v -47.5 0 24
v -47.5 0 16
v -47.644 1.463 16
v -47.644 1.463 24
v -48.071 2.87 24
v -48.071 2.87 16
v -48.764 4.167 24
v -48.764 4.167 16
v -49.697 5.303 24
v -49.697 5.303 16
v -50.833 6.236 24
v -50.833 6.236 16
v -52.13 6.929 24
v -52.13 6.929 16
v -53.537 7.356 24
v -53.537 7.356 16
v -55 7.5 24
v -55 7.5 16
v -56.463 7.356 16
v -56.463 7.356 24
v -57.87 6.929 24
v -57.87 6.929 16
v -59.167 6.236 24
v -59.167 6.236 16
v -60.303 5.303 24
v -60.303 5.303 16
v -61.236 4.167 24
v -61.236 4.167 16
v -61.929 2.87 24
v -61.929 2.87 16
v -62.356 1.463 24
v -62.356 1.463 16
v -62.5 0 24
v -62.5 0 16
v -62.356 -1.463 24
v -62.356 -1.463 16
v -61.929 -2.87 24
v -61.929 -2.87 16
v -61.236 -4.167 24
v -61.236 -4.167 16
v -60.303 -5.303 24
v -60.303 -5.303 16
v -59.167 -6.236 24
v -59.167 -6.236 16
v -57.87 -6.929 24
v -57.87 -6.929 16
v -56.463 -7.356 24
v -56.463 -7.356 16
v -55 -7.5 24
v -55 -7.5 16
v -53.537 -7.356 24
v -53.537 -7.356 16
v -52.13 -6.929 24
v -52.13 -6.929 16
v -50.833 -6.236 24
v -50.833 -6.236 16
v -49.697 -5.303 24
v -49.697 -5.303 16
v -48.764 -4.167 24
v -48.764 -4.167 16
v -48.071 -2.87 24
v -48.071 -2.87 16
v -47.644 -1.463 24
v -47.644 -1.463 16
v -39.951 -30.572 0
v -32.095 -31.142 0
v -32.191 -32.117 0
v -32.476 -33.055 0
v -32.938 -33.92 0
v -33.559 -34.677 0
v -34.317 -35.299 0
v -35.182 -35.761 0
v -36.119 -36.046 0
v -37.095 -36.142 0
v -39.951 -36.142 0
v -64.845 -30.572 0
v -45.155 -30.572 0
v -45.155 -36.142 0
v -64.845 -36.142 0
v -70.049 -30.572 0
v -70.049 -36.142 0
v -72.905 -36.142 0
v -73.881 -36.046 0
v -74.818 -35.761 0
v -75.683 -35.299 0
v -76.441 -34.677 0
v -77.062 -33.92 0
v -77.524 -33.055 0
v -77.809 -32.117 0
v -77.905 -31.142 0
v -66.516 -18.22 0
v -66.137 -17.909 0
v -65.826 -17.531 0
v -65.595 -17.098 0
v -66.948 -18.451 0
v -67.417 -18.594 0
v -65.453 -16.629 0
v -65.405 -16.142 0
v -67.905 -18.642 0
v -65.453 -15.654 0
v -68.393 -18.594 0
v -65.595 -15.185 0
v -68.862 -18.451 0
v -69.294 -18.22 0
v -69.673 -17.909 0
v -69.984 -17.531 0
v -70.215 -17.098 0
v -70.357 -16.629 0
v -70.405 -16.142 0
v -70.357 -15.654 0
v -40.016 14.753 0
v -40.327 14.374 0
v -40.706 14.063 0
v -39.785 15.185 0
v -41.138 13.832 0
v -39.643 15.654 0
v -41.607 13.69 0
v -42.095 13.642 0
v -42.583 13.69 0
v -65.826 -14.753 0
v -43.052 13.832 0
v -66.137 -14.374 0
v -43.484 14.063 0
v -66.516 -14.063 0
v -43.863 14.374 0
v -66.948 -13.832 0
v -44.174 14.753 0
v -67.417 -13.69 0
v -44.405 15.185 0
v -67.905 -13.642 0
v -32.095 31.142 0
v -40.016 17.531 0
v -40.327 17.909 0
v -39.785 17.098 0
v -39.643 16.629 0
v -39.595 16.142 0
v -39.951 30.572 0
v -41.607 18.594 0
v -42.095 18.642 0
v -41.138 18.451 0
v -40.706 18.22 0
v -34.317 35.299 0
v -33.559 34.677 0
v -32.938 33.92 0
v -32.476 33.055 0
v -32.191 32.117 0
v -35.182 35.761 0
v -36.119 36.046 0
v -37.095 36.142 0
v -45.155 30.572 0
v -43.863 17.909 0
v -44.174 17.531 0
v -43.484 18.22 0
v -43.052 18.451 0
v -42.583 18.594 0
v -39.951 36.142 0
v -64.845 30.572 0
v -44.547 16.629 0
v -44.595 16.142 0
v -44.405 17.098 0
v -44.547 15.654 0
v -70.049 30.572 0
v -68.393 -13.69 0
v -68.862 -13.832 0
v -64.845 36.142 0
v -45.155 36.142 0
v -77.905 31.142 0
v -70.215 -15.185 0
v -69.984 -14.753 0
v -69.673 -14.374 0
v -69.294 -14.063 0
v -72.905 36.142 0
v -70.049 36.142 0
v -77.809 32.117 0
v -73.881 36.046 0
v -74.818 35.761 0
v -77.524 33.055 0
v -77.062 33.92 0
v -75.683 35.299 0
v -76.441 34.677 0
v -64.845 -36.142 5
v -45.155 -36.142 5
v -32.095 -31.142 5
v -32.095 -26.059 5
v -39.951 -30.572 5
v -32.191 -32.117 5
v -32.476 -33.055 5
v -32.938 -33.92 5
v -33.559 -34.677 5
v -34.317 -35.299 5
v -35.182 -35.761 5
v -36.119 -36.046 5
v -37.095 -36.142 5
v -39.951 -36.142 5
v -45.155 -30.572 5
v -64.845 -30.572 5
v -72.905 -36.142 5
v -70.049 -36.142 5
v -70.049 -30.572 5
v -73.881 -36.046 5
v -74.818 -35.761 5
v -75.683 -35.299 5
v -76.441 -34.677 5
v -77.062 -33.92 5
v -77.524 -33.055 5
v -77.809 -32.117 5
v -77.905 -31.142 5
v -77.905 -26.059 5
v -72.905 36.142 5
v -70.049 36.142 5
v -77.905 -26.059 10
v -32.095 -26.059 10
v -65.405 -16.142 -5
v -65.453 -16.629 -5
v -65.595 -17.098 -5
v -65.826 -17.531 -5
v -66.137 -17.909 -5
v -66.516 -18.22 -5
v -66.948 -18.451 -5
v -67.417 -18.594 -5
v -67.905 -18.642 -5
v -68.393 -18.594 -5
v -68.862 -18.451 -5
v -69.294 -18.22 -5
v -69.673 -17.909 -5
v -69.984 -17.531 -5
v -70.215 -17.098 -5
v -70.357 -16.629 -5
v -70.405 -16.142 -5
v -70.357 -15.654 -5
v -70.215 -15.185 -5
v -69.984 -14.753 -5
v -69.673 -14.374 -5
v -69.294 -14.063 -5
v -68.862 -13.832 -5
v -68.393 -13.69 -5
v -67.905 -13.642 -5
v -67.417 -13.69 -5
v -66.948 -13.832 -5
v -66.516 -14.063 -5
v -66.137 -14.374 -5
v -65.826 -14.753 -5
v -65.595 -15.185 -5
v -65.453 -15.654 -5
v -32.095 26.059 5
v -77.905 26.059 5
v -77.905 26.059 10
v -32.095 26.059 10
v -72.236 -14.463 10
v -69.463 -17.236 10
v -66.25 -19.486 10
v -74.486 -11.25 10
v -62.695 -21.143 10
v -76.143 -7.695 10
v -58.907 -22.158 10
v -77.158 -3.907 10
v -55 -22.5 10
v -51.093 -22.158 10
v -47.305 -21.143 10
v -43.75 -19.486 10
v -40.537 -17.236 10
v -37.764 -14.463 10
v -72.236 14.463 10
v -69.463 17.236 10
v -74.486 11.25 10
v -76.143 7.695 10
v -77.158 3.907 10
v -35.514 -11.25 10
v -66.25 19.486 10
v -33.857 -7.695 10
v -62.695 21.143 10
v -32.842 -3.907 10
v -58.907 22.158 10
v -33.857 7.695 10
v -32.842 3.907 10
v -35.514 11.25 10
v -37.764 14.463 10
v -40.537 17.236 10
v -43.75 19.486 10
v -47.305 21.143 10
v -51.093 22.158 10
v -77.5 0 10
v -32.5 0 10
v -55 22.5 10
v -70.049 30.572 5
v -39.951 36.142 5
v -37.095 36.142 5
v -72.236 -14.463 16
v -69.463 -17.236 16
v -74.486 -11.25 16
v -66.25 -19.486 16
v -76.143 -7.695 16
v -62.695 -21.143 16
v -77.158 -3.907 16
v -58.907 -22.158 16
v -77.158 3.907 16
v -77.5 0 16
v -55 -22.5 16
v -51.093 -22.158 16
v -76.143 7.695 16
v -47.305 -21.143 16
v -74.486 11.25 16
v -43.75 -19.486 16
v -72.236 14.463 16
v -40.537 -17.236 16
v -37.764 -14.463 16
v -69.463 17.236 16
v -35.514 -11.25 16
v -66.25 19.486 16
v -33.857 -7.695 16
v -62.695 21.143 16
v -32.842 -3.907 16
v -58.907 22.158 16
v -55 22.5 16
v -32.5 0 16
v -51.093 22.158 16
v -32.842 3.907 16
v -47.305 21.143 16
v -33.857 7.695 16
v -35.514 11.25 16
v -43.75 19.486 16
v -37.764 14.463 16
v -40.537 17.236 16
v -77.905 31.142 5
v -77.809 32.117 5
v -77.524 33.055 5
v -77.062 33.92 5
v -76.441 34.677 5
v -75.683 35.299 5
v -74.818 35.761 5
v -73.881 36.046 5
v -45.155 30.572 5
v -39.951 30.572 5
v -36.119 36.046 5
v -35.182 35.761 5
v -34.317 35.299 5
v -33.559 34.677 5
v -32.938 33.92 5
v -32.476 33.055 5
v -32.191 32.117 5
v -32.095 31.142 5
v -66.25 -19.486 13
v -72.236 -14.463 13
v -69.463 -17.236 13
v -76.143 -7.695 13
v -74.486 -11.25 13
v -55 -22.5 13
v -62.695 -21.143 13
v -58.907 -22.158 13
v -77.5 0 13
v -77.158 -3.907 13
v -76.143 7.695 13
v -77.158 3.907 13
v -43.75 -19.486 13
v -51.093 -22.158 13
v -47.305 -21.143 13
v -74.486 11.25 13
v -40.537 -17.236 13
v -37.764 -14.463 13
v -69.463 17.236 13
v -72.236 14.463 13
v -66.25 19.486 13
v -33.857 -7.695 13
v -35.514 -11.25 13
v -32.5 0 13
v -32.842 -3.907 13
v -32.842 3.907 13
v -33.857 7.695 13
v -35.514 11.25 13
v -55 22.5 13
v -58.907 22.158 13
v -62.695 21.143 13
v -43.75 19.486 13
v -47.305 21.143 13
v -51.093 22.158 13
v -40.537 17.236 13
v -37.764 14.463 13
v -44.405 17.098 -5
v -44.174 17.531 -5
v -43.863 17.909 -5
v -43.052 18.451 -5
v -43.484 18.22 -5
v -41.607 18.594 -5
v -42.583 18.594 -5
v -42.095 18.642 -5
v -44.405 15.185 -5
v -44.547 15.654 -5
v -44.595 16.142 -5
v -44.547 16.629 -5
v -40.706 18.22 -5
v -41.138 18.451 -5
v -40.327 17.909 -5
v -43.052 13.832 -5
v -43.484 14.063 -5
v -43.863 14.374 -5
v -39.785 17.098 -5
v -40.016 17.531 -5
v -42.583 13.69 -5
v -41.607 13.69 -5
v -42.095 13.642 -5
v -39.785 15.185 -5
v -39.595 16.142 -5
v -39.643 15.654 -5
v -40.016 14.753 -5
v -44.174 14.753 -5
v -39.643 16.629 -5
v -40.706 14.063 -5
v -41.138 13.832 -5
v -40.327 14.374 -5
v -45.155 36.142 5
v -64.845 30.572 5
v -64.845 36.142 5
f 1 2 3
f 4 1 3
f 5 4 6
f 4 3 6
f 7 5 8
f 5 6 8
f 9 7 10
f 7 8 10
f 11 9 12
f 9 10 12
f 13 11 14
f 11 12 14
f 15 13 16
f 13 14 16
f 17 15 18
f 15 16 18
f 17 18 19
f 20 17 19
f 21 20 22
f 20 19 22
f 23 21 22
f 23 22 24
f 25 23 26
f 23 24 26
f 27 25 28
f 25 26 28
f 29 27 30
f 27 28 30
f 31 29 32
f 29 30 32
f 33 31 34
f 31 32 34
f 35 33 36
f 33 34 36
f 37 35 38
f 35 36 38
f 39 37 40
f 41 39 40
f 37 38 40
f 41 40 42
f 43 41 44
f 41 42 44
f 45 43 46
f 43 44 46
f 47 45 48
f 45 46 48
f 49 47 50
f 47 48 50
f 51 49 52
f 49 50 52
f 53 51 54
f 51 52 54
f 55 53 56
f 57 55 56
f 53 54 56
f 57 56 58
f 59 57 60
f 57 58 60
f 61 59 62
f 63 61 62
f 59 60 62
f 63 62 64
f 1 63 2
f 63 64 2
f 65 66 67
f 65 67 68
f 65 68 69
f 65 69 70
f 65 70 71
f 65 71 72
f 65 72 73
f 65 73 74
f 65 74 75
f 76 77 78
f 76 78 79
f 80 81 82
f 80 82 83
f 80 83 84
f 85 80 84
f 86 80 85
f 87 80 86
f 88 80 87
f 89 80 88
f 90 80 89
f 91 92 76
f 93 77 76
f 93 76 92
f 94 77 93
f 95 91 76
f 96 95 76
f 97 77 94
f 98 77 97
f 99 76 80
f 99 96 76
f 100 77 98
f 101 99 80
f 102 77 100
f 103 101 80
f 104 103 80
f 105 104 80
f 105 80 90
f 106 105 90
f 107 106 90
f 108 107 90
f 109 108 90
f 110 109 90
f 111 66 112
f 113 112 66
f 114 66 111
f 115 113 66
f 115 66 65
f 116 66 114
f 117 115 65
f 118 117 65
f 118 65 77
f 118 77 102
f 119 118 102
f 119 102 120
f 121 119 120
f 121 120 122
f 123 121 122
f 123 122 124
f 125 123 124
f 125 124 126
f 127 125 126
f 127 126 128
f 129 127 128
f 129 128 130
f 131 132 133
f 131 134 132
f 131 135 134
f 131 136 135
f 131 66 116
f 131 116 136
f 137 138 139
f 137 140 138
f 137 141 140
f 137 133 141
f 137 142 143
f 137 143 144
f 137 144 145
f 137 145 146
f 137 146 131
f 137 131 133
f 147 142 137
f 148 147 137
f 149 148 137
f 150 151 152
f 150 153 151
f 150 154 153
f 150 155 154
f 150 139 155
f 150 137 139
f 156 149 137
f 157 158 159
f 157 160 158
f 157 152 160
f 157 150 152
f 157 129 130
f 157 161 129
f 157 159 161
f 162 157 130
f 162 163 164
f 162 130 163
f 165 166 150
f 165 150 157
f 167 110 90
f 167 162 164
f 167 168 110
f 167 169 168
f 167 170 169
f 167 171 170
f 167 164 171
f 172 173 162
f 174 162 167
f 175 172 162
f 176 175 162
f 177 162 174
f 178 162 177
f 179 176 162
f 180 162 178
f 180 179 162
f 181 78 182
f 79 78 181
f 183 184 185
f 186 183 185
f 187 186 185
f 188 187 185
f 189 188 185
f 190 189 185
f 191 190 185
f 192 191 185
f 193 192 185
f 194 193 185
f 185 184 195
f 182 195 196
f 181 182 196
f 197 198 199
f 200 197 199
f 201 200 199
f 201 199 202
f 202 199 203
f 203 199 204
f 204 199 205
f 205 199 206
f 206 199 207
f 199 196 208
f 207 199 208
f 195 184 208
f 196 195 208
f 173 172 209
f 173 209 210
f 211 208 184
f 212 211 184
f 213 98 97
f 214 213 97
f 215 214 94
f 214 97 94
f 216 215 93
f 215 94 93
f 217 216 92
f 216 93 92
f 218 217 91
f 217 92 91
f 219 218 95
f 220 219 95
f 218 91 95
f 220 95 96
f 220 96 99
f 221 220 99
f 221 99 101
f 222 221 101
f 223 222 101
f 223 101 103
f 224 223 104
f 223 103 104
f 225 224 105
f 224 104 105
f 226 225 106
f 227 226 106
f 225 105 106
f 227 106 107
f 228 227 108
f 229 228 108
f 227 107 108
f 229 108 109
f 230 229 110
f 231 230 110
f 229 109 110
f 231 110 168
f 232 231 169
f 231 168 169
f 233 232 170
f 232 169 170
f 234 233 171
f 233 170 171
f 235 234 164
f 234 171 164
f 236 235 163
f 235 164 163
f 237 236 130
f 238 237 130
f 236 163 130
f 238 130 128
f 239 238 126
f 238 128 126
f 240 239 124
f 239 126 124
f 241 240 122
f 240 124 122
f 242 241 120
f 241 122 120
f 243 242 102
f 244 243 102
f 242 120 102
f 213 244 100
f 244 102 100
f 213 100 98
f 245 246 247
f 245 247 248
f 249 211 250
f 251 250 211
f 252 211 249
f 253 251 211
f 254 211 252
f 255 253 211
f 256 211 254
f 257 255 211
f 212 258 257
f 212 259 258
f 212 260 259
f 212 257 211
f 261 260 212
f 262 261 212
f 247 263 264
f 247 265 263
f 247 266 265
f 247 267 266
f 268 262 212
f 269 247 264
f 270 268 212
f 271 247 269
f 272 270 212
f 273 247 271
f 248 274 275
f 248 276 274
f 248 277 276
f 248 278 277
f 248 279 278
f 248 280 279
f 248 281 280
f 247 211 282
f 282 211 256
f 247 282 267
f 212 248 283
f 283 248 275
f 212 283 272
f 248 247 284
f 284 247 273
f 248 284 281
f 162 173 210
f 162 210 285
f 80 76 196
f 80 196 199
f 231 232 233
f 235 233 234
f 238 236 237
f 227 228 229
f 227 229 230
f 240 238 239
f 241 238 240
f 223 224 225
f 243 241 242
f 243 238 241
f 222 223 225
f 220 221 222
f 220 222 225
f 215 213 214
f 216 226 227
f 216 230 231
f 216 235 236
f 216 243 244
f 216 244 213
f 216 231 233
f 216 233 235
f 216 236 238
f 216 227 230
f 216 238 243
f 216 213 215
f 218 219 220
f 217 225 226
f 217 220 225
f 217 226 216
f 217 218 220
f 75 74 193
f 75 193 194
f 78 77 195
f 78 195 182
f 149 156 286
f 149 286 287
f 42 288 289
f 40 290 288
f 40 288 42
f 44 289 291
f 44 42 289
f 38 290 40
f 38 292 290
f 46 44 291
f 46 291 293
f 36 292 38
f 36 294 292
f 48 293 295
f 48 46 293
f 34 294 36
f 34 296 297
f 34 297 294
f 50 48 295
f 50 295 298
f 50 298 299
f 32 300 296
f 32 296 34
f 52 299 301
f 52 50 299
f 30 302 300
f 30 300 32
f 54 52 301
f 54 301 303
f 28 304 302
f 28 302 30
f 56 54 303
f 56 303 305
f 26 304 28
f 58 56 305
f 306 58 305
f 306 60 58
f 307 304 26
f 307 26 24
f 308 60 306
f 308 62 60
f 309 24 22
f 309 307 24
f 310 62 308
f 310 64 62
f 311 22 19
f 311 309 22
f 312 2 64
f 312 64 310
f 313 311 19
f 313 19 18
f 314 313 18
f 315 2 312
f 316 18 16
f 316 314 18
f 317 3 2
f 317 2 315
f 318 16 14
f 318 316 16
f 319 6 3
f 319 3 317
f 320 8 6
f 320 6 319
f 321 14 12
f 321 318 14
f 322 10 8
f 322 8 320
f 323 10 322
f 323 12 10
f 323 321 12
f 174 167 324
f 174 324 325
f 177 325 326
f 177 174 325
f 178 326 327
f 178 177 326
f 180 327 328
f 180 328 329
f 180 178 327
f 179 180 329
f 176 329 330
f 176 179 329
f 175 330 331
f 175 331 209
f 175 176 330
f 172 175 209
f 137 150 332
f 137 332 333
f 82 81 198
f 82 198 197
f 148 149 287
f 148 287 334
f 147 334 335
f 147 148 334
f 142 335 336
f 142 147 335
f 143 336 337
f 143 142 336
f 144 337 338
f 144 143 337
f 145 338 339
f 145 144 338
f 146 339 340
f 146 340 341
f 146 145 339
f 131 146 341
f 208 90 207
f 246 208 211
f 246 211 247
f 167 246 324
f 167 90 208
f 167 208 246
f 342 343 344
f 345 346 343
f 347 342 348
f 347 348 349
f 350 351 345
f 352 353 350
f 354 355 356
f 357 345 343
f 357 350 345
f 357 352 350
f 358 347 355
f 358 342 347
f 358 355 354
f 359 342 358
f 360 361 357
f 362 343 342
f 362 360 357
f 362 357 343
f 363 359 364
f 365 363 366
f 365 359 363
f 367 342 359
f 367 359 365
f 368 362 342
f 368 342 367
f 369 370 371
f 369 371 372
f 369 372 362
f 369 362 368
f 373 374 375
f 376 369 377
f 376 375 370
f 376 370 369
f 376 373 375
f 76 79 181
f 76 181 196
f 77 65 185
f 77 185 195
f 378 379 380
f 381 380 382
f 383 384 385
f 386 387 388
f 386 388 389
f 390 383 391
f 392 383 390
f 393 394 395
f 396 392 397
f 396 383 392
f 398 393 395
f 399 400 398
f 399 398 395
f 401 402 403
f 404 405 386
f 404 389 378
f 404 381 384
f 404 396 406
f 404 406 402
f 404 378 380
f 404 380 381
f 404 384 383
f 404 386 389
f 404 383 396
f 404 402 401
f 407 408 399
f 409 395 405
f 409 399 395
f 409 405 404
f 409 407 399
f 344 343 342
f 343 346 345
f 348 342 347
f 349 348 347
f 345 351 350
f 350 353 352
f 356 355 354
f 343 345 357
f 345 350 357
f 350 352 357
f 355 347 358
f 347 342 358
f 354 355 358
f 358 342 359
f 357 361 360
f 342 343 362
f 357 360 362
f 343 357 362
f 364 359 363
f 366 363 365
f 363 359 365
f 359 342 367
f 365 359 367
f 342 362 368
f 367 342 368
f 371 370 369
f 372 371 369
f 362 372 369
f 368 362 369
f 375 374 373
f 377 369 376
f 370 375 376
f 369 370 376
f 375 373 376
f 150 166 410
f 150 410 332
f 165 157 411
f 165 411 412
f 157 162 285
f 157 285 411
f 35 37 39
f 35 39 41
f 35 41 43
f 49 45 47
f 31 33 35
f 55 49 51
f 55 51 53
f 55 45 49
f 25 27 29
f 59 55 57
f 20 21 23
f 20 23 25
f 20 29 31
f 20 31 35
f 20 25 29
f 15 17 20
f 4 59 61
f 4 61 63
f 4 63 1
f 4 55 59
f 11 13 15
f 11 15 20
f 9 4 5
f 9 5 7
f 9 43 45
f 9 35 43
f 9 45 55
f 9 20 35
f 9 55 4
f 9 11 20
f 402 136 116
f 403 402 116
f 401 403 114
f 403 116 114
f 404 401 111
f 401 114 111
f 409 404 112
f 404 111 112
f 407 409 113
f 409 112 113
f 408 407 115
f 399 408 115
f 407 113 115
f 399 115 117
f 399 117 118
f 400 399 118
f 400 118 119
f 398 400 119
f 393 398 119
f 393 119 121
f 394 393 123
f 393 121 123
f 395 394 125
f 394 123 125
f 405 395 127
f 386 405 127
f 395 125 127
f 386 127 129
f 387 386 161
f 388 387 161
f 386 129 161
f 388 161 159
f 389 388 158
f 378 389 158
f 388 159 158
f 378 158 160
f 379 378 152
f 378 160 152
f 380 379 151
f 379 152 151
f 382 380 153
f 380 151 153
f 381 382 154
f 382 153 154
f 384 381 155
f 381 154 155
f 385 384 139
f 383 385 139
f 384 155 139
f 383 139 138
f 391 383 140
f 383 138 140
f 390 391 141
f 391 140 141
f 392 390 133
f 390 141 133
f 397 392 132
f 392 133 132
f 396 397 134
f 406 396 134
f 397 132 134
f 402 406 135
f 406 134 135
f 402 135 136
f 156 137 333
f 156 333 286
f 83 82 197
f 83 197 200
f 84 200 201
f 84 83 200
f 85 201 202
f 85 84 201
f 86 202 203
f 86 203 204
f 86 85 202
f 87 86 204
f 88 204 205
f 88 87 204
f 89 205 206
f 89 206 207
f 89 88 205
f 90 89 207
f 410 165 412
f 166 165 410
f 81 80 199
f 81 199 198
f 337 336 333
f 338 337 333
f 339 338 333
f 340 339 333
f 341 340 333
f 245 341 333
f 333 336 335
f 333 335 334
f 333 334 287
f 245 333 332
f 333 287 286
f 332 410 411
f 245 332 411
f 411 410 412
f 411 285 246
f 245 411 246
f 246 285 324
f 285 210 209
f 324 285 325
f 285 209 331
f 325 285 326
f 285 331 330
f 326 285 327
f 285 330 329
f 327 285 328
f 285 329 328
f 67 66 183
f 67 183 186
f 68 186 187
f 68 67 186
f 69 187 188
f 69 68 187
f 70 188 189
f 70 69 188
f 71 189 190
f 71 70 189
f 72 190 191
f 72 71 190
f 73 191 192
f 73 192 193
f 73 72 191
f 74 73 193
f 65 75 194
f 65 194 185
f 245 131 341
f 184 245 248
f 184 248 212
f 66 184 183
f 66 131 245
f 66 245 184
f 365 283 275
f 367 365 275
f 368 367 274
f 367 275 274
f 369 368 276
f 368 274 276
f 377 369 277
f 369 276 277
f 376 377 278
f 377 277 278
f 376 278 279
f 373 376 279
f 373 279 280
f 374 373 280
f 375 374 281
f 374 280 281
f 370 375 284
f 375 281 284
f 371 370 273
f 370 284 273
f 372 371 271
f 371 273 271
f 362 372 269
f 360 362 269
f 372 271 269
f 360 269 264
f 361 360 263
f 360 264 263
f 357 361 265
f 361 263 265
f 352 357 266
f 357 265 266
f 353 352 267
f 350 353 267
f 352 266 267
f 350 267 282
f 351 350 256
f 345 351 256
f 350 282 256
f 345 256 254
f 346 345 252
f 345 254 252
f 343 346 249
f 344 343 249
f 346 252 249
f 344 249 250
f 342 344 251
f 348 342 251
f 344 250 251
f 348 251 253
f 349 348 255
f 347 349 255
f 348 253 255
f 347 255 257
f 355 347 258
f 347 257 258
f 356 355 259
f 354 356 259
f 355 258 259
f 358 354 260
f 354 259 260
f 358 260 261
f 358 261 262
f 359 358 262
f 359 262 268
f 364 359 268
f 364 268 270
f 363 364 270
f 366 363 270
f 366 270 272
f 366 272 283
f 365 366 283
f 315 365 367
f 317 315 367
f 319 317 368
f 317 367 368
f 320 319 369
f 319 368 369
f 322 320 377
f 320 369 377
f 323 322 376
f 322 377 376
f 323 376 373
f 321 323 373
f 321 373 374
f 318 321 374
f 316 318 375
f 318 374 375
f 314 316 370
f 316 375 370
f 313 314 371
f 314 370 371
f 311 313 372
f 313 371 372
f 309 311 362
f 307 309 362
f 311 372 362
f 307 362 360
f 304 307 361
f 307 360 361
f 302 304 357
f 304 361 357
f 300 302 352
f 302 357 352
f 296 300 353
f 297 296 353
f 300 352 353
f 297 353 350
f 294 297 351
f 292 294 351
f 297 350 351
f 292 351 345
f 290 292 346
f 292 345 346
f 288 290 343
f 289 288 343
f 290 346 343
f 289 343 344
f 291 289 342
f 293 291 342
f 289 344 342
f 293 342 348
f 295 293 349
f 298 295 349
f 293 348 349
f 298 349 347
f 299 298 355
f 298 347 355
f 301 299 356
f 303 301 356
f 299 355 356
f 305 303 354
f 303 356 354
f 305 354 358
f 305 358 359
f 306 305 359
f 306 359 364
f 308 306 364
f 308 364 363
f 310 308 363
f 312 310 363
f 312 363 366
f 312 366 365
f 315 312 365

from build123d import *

# Parameters (mm, degrees)
BOSS_EXTRUDE1_DEPTH = 5
SKETCH2_W           = 45.810159344
SKETCH2_H           = 52.118901322
BOSS_EXTRUDE2_DEPTH = 5
SKETCH3_R           = 22.5
BOSS_EXTRUDE3_DEPTH = 3
SKETCH4_R           = 22.5
BOSS_EXTRUDE4_DEPTH = 3
SKETCH5_R           = 7.5
BOSS_EXTRUDE5_DEPTH = 8
SKETCH6_R           = 2.5
BOSS_EXTRUDE6_DEPTH = 5


with BuildPart() as part:
    # Sketch1 → Boss-Extrude1 (new body)
    with BuildSketch(Plane.XY):
        with BuildLine():
            Line((-70.048605571, 36.141662037), (-70.048605571, 30.571525081))
            Line((-70.048605571, 30.571525081), (-64.84517384, 30.571525081))
            Line((-64.84517384, 30.571525081), (-64.84517384, 36.141662037))
            Line((-64.84517384, 36.141662037), (-45.15482616, 36.141662037))
            Line((-45.15482616, 36.141662037), (-45.15482616, 30.571525081))
            Line((-45.15482616, 30.571525081), (-39.951394429, 30.571525081))
            Line((-39.951394429, 30.571525081), (-39.951394429, 36.141662037))
            Line((-39.951394429, 36.141662037), (-37.094920328, 36.141662037))
            ThreePointArc((-37.094920328, 36.141662037), (-33.559386422, 34.677195943), (-32.094920328, 31.141662037))
            Line((-32.094920328, 31.141662037), (-32.094920328, -31.141662037))
            ThreePointArc((-32.094920328, -31.141662037), (-33.559386422, -34.677195943), (-37.094920328, -36.141662037))
            Line((-37.094920328, -36.141662037), (-39.951394429, -36.141662037))
            Line((-39.951394429, -36.141662037), (-39.951394429, -30.571525081))
            Line((-39.951394429, -30.571525081), (-45.15482616, -30.571525081))
            Line((-45.15482616, -30.571525081), (-45.15482616, -36.141662037))
            Line((-45.15482616, -36.141662037), (-64.84517384, -36.141662037))
            Line((-64.84517384, -36.141662037), (-64.84517384, -30.571525081))
            Line((-64.84517384, -30.571525081), (-70.048605571, -30.571525081))
            Line((-70.048605571, -30.571525081), (-70.048605571, -36.141662037))
            Line((-70.048605571, -36.141662037), (-72.905079672, -36.141662037))
            ThreePointArc((-72.905079672, -36.141662037), (-76.440613578, -34.677195943), (-77.905079672, -31.141662037))
            Line((-77.905079672, -31.141662037), (-77.905079672, 31.141662037))
            ThreePointArc((-77.905079672, 31.141662037), (-76.440613578, 34.677195943), (-72.905079672, 36.141662037))
            Line((-72.905079672, 36.141662037), (-70.048605571, 36.141662037))
        make_face()
    extrude(amount=BOSS_EXTRUDE1_DEPTH)

    # Sketch2 → Boss-Extrude2 (add)
    with BuildSketch(Plane.XY.offset(5)):
        with Locations((-55, 0)):
            Rectangle(SKETCH2_W, SKETCH2_H)
    extrude(amount=BOSS_EXTRUDE2_DEPTH)

    # Sketch3 → Boss-Extrude3 (add)
    with BuildSketch(Plane.XY.offset(10)):
        with Locations((-55, 0)):
            Circle(SKETCH3_R)
    extrude(amount=BOSS_EXTRUDE3_DEPTH)

    # Sketch6 → Boss-Extrude6 (add)
    with BuildSketch(Plane(origin=(0, 0, 0), x_dir=(-1, 0, 0), z_dir=(0, 0, -1))):
        with Locations(Location((42.094920328, 16.141662037, 0), (0, 0, 180))):
            Circle(SKETCH6_R)
        with Locations(Location((67.905079672, -16.141662037, 0), (0, 0, 180))):
            Circle(SKETCH6_R)
    extrude(amount=BOSS_EXTRUDE6_DEPTH)


with BuildPart() as body_2:
    # Sketch4 → Boss-Extrude4 (new body)
    with BuildSketch(Plane.XY.offset(13)):
        with Locations((-55, 0)):
            Circle(SKETCH4_R)
    extrude(amount=BOSS_EXTRUDE4_DEPTH)

    # Sketch5 → Boss-Extrude5 (add)
    with BuildSketch(Plane.XY.offset(16)):
        with Locations((-55, 0)):
            Circle(SKETCH5_R)
    extrude(amount=BOSS_EXTRUDE5_DEPTH)


solid = Compound([part.part, body_2.part])
